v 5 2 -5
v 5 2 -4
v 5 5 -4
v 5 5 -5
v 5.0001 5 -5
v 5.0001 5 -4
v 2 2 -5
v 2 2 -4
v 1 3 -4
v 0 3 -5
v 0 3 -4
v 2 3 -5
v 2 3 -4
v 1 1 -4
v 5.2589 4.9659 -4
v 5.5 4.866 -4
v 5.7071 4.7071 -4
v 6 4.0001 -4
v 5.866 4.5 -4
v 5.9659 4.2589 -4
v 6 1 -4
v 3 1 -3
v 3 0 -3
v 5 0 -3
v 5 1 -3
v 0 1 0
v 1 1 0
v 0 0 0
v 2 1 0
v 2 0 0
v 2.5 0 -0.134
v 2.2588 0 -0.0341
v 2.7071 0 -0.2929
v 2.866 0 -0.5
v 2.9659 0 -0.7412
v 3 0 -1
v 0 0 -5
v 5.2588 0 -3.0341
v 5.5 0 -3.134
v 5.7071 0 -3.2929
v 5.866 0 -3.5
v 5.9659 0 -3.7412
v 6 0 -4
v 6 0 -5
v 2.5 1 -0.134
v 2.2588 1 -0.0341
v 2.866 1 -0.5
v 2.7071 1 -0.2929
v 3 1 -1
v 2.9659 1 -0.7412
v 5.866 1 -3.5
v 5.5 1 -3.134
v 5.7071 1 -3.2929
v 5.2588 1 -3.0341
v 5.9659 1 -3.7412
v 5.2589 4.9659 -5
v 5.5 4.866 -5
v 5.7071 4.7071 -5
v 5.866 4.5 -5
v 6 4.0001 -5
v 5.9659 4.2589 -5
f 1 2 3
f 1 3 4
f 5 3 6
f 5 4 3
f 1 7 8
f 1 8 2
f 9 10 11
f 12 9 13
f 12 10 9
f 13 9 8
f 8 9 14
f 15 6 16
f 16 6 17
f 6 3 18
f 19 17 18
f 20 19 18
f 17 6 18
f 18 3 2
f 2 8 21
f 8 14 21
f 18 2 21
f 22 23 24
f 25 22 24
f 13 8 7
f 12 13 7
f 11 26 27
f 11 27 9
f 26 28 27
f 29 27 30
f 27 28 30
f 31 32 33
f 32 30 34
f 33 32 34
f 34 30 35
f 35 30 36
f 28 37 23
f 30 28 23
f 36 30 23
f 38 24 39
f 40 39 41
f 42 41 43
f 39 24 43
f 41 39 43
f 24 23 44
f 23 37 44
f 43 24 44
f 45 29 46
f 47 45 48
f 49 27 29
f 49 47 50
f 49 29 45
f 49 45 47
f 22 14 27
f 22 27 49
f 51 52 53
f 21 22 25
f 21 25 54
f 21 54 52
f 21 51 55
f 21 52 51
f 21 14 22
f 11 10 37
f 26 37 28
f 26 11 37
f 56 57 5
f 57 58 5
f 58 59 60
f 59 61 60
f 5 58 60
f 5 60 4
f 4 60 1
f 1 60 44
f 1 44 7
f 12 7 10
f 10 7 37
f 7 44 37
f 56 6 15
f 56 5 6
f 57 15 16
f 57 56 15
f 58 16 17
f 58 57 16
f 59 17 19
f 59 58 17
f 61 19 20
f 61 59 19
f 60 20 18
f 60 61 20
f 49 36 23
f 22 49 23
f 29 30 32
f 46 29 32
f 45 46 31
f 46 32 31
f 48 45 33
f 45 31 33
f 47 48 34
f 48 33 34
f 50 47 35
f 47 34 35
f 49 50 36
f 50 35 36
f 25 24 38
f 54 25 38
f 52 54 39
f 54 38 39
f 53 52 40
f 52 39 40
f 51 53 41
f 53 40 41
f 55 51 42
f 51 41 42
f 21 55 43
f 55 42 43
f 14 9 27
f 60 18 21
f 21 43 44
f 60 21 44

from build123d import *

# Parameters (mm, degrees)
SKETCH_1_W      = 2
SKETCH_1_H      = 1
SKETCH_1_W_2    = 3
SKETCH_1_W_3    = 1
EXTRUDE_1_DEPTH = 1
SKETCH_1_3_W    = 3
SKETCH_1_3_H    = 1
EXTRUDE_2_DEPTH = 2
SKETCH_1_4_W    = 2
SKETCH_1_4_H    = 1
EXTRUDE_3_DEPTH = 3
SKETCH_1_5_W    = 1
SKETCH_1_5_H    = 1
EXTRUDE_4_DEPTH = 5
FILLET_1_R      = 1
EXTRUDE_5_DEPTH = 1


with BuildPart() as part:
    # 草圖1 → 填料-伸長1 (new body)
    with BuildSketch(Plane(origin=(0, 0, 0), x_dir=(1, 0, 0), z_dir=(0, 1, 0))):
        with Locations((1, 4.5)):
            Rectangle(SKETCH_1_W, SKETCH_1_H)
        with BuildLine():
            Line((0, 4), (0, 0))
            Line((0, 0), (2, 0))
            ThreePointArc((2, 0), (2.707106781, 0.292893219), (3, 1))
            Line((3, 1), (3, 3))
            Line((3, 3), (5, 3))
            ThreePointArc((5, 3), (5.707106781, 3.292893219), (6, 4))
            Line((6, 4), (5, 4))
            Line((5, 4), (2, 4))
            Line((2, 4), (0, 4))
        make_face()
        with Locations((3.5, 4.5)):
            Rectangle(SKETCH_1_W_2, SKETCH_1_H)
        with Locations((5.5, 4.5)):
            Rectangle(SKETCH_1_W_3, SKETCH_1_H)
    extrude(amount=EXTRUDE_1_DEPTH)

    # 草圖1<3> → 填料-伸長2 (add)
    with BuildSketch(Plane(origin=(0, 0, 0), x_dir=(1, 0, 0), z_dir=(0, 1, 0))):
        with Locations((3.5, 4.5)):
            Rectangle(SKETCH_1_3_W, SKETCH_1_3_H)
    extrude(amount=EXTRUDE_2_DEPTH)

    # 草圖1<4> → 填料-伸長3 (add)
    with BuildSketch(Plane(origin=(0, 0, 0), x_dir=(1, 0, 0), z_dir=(0, 1, 0))):
        with Locations((1, 4.5)):
            Rectangle(SKETCH_1_4_W, SKETCH_1_4_H)
    extrude(amount=EXTRUDE_3_DEPTH)

    # 草圖1<5> → 填料-伸長4 (add)
    with BuildSketch(Plane(origin=(0, 0, 0), x_dir=(1, 0, 0), z_dir=(0, 1, 0))):
        with Locations((5.5, 4.5)):
            Rectangle(SKETCH_1_5_W, SKETCH_1_5_H)
    extrude(amount=EXTRUDE_4_DEPTH)

    # 圓角1
    fillet_1_edges = [part.edges().sort_by_distance(p)[0] for p in [
        (6, 5, -4.5),
    ]]
    fillet(fillet_1_edges, radius=FILLET_1_R - 0.0001)  # a hair under: the kernel refuses the full size

    # 草圖2 → 填料-伸長5 (add)
    with BuildSketch(Plane(origin=(0, 0, 0), x_dir=(0, 0, -1), z_dir=(1, 0, 0))):
        Polygon((0, 1), (4, 3), (4, 1), align=None)
    extrude(amount=EXTRUDE_5_DEPTH)


solid = part.part
